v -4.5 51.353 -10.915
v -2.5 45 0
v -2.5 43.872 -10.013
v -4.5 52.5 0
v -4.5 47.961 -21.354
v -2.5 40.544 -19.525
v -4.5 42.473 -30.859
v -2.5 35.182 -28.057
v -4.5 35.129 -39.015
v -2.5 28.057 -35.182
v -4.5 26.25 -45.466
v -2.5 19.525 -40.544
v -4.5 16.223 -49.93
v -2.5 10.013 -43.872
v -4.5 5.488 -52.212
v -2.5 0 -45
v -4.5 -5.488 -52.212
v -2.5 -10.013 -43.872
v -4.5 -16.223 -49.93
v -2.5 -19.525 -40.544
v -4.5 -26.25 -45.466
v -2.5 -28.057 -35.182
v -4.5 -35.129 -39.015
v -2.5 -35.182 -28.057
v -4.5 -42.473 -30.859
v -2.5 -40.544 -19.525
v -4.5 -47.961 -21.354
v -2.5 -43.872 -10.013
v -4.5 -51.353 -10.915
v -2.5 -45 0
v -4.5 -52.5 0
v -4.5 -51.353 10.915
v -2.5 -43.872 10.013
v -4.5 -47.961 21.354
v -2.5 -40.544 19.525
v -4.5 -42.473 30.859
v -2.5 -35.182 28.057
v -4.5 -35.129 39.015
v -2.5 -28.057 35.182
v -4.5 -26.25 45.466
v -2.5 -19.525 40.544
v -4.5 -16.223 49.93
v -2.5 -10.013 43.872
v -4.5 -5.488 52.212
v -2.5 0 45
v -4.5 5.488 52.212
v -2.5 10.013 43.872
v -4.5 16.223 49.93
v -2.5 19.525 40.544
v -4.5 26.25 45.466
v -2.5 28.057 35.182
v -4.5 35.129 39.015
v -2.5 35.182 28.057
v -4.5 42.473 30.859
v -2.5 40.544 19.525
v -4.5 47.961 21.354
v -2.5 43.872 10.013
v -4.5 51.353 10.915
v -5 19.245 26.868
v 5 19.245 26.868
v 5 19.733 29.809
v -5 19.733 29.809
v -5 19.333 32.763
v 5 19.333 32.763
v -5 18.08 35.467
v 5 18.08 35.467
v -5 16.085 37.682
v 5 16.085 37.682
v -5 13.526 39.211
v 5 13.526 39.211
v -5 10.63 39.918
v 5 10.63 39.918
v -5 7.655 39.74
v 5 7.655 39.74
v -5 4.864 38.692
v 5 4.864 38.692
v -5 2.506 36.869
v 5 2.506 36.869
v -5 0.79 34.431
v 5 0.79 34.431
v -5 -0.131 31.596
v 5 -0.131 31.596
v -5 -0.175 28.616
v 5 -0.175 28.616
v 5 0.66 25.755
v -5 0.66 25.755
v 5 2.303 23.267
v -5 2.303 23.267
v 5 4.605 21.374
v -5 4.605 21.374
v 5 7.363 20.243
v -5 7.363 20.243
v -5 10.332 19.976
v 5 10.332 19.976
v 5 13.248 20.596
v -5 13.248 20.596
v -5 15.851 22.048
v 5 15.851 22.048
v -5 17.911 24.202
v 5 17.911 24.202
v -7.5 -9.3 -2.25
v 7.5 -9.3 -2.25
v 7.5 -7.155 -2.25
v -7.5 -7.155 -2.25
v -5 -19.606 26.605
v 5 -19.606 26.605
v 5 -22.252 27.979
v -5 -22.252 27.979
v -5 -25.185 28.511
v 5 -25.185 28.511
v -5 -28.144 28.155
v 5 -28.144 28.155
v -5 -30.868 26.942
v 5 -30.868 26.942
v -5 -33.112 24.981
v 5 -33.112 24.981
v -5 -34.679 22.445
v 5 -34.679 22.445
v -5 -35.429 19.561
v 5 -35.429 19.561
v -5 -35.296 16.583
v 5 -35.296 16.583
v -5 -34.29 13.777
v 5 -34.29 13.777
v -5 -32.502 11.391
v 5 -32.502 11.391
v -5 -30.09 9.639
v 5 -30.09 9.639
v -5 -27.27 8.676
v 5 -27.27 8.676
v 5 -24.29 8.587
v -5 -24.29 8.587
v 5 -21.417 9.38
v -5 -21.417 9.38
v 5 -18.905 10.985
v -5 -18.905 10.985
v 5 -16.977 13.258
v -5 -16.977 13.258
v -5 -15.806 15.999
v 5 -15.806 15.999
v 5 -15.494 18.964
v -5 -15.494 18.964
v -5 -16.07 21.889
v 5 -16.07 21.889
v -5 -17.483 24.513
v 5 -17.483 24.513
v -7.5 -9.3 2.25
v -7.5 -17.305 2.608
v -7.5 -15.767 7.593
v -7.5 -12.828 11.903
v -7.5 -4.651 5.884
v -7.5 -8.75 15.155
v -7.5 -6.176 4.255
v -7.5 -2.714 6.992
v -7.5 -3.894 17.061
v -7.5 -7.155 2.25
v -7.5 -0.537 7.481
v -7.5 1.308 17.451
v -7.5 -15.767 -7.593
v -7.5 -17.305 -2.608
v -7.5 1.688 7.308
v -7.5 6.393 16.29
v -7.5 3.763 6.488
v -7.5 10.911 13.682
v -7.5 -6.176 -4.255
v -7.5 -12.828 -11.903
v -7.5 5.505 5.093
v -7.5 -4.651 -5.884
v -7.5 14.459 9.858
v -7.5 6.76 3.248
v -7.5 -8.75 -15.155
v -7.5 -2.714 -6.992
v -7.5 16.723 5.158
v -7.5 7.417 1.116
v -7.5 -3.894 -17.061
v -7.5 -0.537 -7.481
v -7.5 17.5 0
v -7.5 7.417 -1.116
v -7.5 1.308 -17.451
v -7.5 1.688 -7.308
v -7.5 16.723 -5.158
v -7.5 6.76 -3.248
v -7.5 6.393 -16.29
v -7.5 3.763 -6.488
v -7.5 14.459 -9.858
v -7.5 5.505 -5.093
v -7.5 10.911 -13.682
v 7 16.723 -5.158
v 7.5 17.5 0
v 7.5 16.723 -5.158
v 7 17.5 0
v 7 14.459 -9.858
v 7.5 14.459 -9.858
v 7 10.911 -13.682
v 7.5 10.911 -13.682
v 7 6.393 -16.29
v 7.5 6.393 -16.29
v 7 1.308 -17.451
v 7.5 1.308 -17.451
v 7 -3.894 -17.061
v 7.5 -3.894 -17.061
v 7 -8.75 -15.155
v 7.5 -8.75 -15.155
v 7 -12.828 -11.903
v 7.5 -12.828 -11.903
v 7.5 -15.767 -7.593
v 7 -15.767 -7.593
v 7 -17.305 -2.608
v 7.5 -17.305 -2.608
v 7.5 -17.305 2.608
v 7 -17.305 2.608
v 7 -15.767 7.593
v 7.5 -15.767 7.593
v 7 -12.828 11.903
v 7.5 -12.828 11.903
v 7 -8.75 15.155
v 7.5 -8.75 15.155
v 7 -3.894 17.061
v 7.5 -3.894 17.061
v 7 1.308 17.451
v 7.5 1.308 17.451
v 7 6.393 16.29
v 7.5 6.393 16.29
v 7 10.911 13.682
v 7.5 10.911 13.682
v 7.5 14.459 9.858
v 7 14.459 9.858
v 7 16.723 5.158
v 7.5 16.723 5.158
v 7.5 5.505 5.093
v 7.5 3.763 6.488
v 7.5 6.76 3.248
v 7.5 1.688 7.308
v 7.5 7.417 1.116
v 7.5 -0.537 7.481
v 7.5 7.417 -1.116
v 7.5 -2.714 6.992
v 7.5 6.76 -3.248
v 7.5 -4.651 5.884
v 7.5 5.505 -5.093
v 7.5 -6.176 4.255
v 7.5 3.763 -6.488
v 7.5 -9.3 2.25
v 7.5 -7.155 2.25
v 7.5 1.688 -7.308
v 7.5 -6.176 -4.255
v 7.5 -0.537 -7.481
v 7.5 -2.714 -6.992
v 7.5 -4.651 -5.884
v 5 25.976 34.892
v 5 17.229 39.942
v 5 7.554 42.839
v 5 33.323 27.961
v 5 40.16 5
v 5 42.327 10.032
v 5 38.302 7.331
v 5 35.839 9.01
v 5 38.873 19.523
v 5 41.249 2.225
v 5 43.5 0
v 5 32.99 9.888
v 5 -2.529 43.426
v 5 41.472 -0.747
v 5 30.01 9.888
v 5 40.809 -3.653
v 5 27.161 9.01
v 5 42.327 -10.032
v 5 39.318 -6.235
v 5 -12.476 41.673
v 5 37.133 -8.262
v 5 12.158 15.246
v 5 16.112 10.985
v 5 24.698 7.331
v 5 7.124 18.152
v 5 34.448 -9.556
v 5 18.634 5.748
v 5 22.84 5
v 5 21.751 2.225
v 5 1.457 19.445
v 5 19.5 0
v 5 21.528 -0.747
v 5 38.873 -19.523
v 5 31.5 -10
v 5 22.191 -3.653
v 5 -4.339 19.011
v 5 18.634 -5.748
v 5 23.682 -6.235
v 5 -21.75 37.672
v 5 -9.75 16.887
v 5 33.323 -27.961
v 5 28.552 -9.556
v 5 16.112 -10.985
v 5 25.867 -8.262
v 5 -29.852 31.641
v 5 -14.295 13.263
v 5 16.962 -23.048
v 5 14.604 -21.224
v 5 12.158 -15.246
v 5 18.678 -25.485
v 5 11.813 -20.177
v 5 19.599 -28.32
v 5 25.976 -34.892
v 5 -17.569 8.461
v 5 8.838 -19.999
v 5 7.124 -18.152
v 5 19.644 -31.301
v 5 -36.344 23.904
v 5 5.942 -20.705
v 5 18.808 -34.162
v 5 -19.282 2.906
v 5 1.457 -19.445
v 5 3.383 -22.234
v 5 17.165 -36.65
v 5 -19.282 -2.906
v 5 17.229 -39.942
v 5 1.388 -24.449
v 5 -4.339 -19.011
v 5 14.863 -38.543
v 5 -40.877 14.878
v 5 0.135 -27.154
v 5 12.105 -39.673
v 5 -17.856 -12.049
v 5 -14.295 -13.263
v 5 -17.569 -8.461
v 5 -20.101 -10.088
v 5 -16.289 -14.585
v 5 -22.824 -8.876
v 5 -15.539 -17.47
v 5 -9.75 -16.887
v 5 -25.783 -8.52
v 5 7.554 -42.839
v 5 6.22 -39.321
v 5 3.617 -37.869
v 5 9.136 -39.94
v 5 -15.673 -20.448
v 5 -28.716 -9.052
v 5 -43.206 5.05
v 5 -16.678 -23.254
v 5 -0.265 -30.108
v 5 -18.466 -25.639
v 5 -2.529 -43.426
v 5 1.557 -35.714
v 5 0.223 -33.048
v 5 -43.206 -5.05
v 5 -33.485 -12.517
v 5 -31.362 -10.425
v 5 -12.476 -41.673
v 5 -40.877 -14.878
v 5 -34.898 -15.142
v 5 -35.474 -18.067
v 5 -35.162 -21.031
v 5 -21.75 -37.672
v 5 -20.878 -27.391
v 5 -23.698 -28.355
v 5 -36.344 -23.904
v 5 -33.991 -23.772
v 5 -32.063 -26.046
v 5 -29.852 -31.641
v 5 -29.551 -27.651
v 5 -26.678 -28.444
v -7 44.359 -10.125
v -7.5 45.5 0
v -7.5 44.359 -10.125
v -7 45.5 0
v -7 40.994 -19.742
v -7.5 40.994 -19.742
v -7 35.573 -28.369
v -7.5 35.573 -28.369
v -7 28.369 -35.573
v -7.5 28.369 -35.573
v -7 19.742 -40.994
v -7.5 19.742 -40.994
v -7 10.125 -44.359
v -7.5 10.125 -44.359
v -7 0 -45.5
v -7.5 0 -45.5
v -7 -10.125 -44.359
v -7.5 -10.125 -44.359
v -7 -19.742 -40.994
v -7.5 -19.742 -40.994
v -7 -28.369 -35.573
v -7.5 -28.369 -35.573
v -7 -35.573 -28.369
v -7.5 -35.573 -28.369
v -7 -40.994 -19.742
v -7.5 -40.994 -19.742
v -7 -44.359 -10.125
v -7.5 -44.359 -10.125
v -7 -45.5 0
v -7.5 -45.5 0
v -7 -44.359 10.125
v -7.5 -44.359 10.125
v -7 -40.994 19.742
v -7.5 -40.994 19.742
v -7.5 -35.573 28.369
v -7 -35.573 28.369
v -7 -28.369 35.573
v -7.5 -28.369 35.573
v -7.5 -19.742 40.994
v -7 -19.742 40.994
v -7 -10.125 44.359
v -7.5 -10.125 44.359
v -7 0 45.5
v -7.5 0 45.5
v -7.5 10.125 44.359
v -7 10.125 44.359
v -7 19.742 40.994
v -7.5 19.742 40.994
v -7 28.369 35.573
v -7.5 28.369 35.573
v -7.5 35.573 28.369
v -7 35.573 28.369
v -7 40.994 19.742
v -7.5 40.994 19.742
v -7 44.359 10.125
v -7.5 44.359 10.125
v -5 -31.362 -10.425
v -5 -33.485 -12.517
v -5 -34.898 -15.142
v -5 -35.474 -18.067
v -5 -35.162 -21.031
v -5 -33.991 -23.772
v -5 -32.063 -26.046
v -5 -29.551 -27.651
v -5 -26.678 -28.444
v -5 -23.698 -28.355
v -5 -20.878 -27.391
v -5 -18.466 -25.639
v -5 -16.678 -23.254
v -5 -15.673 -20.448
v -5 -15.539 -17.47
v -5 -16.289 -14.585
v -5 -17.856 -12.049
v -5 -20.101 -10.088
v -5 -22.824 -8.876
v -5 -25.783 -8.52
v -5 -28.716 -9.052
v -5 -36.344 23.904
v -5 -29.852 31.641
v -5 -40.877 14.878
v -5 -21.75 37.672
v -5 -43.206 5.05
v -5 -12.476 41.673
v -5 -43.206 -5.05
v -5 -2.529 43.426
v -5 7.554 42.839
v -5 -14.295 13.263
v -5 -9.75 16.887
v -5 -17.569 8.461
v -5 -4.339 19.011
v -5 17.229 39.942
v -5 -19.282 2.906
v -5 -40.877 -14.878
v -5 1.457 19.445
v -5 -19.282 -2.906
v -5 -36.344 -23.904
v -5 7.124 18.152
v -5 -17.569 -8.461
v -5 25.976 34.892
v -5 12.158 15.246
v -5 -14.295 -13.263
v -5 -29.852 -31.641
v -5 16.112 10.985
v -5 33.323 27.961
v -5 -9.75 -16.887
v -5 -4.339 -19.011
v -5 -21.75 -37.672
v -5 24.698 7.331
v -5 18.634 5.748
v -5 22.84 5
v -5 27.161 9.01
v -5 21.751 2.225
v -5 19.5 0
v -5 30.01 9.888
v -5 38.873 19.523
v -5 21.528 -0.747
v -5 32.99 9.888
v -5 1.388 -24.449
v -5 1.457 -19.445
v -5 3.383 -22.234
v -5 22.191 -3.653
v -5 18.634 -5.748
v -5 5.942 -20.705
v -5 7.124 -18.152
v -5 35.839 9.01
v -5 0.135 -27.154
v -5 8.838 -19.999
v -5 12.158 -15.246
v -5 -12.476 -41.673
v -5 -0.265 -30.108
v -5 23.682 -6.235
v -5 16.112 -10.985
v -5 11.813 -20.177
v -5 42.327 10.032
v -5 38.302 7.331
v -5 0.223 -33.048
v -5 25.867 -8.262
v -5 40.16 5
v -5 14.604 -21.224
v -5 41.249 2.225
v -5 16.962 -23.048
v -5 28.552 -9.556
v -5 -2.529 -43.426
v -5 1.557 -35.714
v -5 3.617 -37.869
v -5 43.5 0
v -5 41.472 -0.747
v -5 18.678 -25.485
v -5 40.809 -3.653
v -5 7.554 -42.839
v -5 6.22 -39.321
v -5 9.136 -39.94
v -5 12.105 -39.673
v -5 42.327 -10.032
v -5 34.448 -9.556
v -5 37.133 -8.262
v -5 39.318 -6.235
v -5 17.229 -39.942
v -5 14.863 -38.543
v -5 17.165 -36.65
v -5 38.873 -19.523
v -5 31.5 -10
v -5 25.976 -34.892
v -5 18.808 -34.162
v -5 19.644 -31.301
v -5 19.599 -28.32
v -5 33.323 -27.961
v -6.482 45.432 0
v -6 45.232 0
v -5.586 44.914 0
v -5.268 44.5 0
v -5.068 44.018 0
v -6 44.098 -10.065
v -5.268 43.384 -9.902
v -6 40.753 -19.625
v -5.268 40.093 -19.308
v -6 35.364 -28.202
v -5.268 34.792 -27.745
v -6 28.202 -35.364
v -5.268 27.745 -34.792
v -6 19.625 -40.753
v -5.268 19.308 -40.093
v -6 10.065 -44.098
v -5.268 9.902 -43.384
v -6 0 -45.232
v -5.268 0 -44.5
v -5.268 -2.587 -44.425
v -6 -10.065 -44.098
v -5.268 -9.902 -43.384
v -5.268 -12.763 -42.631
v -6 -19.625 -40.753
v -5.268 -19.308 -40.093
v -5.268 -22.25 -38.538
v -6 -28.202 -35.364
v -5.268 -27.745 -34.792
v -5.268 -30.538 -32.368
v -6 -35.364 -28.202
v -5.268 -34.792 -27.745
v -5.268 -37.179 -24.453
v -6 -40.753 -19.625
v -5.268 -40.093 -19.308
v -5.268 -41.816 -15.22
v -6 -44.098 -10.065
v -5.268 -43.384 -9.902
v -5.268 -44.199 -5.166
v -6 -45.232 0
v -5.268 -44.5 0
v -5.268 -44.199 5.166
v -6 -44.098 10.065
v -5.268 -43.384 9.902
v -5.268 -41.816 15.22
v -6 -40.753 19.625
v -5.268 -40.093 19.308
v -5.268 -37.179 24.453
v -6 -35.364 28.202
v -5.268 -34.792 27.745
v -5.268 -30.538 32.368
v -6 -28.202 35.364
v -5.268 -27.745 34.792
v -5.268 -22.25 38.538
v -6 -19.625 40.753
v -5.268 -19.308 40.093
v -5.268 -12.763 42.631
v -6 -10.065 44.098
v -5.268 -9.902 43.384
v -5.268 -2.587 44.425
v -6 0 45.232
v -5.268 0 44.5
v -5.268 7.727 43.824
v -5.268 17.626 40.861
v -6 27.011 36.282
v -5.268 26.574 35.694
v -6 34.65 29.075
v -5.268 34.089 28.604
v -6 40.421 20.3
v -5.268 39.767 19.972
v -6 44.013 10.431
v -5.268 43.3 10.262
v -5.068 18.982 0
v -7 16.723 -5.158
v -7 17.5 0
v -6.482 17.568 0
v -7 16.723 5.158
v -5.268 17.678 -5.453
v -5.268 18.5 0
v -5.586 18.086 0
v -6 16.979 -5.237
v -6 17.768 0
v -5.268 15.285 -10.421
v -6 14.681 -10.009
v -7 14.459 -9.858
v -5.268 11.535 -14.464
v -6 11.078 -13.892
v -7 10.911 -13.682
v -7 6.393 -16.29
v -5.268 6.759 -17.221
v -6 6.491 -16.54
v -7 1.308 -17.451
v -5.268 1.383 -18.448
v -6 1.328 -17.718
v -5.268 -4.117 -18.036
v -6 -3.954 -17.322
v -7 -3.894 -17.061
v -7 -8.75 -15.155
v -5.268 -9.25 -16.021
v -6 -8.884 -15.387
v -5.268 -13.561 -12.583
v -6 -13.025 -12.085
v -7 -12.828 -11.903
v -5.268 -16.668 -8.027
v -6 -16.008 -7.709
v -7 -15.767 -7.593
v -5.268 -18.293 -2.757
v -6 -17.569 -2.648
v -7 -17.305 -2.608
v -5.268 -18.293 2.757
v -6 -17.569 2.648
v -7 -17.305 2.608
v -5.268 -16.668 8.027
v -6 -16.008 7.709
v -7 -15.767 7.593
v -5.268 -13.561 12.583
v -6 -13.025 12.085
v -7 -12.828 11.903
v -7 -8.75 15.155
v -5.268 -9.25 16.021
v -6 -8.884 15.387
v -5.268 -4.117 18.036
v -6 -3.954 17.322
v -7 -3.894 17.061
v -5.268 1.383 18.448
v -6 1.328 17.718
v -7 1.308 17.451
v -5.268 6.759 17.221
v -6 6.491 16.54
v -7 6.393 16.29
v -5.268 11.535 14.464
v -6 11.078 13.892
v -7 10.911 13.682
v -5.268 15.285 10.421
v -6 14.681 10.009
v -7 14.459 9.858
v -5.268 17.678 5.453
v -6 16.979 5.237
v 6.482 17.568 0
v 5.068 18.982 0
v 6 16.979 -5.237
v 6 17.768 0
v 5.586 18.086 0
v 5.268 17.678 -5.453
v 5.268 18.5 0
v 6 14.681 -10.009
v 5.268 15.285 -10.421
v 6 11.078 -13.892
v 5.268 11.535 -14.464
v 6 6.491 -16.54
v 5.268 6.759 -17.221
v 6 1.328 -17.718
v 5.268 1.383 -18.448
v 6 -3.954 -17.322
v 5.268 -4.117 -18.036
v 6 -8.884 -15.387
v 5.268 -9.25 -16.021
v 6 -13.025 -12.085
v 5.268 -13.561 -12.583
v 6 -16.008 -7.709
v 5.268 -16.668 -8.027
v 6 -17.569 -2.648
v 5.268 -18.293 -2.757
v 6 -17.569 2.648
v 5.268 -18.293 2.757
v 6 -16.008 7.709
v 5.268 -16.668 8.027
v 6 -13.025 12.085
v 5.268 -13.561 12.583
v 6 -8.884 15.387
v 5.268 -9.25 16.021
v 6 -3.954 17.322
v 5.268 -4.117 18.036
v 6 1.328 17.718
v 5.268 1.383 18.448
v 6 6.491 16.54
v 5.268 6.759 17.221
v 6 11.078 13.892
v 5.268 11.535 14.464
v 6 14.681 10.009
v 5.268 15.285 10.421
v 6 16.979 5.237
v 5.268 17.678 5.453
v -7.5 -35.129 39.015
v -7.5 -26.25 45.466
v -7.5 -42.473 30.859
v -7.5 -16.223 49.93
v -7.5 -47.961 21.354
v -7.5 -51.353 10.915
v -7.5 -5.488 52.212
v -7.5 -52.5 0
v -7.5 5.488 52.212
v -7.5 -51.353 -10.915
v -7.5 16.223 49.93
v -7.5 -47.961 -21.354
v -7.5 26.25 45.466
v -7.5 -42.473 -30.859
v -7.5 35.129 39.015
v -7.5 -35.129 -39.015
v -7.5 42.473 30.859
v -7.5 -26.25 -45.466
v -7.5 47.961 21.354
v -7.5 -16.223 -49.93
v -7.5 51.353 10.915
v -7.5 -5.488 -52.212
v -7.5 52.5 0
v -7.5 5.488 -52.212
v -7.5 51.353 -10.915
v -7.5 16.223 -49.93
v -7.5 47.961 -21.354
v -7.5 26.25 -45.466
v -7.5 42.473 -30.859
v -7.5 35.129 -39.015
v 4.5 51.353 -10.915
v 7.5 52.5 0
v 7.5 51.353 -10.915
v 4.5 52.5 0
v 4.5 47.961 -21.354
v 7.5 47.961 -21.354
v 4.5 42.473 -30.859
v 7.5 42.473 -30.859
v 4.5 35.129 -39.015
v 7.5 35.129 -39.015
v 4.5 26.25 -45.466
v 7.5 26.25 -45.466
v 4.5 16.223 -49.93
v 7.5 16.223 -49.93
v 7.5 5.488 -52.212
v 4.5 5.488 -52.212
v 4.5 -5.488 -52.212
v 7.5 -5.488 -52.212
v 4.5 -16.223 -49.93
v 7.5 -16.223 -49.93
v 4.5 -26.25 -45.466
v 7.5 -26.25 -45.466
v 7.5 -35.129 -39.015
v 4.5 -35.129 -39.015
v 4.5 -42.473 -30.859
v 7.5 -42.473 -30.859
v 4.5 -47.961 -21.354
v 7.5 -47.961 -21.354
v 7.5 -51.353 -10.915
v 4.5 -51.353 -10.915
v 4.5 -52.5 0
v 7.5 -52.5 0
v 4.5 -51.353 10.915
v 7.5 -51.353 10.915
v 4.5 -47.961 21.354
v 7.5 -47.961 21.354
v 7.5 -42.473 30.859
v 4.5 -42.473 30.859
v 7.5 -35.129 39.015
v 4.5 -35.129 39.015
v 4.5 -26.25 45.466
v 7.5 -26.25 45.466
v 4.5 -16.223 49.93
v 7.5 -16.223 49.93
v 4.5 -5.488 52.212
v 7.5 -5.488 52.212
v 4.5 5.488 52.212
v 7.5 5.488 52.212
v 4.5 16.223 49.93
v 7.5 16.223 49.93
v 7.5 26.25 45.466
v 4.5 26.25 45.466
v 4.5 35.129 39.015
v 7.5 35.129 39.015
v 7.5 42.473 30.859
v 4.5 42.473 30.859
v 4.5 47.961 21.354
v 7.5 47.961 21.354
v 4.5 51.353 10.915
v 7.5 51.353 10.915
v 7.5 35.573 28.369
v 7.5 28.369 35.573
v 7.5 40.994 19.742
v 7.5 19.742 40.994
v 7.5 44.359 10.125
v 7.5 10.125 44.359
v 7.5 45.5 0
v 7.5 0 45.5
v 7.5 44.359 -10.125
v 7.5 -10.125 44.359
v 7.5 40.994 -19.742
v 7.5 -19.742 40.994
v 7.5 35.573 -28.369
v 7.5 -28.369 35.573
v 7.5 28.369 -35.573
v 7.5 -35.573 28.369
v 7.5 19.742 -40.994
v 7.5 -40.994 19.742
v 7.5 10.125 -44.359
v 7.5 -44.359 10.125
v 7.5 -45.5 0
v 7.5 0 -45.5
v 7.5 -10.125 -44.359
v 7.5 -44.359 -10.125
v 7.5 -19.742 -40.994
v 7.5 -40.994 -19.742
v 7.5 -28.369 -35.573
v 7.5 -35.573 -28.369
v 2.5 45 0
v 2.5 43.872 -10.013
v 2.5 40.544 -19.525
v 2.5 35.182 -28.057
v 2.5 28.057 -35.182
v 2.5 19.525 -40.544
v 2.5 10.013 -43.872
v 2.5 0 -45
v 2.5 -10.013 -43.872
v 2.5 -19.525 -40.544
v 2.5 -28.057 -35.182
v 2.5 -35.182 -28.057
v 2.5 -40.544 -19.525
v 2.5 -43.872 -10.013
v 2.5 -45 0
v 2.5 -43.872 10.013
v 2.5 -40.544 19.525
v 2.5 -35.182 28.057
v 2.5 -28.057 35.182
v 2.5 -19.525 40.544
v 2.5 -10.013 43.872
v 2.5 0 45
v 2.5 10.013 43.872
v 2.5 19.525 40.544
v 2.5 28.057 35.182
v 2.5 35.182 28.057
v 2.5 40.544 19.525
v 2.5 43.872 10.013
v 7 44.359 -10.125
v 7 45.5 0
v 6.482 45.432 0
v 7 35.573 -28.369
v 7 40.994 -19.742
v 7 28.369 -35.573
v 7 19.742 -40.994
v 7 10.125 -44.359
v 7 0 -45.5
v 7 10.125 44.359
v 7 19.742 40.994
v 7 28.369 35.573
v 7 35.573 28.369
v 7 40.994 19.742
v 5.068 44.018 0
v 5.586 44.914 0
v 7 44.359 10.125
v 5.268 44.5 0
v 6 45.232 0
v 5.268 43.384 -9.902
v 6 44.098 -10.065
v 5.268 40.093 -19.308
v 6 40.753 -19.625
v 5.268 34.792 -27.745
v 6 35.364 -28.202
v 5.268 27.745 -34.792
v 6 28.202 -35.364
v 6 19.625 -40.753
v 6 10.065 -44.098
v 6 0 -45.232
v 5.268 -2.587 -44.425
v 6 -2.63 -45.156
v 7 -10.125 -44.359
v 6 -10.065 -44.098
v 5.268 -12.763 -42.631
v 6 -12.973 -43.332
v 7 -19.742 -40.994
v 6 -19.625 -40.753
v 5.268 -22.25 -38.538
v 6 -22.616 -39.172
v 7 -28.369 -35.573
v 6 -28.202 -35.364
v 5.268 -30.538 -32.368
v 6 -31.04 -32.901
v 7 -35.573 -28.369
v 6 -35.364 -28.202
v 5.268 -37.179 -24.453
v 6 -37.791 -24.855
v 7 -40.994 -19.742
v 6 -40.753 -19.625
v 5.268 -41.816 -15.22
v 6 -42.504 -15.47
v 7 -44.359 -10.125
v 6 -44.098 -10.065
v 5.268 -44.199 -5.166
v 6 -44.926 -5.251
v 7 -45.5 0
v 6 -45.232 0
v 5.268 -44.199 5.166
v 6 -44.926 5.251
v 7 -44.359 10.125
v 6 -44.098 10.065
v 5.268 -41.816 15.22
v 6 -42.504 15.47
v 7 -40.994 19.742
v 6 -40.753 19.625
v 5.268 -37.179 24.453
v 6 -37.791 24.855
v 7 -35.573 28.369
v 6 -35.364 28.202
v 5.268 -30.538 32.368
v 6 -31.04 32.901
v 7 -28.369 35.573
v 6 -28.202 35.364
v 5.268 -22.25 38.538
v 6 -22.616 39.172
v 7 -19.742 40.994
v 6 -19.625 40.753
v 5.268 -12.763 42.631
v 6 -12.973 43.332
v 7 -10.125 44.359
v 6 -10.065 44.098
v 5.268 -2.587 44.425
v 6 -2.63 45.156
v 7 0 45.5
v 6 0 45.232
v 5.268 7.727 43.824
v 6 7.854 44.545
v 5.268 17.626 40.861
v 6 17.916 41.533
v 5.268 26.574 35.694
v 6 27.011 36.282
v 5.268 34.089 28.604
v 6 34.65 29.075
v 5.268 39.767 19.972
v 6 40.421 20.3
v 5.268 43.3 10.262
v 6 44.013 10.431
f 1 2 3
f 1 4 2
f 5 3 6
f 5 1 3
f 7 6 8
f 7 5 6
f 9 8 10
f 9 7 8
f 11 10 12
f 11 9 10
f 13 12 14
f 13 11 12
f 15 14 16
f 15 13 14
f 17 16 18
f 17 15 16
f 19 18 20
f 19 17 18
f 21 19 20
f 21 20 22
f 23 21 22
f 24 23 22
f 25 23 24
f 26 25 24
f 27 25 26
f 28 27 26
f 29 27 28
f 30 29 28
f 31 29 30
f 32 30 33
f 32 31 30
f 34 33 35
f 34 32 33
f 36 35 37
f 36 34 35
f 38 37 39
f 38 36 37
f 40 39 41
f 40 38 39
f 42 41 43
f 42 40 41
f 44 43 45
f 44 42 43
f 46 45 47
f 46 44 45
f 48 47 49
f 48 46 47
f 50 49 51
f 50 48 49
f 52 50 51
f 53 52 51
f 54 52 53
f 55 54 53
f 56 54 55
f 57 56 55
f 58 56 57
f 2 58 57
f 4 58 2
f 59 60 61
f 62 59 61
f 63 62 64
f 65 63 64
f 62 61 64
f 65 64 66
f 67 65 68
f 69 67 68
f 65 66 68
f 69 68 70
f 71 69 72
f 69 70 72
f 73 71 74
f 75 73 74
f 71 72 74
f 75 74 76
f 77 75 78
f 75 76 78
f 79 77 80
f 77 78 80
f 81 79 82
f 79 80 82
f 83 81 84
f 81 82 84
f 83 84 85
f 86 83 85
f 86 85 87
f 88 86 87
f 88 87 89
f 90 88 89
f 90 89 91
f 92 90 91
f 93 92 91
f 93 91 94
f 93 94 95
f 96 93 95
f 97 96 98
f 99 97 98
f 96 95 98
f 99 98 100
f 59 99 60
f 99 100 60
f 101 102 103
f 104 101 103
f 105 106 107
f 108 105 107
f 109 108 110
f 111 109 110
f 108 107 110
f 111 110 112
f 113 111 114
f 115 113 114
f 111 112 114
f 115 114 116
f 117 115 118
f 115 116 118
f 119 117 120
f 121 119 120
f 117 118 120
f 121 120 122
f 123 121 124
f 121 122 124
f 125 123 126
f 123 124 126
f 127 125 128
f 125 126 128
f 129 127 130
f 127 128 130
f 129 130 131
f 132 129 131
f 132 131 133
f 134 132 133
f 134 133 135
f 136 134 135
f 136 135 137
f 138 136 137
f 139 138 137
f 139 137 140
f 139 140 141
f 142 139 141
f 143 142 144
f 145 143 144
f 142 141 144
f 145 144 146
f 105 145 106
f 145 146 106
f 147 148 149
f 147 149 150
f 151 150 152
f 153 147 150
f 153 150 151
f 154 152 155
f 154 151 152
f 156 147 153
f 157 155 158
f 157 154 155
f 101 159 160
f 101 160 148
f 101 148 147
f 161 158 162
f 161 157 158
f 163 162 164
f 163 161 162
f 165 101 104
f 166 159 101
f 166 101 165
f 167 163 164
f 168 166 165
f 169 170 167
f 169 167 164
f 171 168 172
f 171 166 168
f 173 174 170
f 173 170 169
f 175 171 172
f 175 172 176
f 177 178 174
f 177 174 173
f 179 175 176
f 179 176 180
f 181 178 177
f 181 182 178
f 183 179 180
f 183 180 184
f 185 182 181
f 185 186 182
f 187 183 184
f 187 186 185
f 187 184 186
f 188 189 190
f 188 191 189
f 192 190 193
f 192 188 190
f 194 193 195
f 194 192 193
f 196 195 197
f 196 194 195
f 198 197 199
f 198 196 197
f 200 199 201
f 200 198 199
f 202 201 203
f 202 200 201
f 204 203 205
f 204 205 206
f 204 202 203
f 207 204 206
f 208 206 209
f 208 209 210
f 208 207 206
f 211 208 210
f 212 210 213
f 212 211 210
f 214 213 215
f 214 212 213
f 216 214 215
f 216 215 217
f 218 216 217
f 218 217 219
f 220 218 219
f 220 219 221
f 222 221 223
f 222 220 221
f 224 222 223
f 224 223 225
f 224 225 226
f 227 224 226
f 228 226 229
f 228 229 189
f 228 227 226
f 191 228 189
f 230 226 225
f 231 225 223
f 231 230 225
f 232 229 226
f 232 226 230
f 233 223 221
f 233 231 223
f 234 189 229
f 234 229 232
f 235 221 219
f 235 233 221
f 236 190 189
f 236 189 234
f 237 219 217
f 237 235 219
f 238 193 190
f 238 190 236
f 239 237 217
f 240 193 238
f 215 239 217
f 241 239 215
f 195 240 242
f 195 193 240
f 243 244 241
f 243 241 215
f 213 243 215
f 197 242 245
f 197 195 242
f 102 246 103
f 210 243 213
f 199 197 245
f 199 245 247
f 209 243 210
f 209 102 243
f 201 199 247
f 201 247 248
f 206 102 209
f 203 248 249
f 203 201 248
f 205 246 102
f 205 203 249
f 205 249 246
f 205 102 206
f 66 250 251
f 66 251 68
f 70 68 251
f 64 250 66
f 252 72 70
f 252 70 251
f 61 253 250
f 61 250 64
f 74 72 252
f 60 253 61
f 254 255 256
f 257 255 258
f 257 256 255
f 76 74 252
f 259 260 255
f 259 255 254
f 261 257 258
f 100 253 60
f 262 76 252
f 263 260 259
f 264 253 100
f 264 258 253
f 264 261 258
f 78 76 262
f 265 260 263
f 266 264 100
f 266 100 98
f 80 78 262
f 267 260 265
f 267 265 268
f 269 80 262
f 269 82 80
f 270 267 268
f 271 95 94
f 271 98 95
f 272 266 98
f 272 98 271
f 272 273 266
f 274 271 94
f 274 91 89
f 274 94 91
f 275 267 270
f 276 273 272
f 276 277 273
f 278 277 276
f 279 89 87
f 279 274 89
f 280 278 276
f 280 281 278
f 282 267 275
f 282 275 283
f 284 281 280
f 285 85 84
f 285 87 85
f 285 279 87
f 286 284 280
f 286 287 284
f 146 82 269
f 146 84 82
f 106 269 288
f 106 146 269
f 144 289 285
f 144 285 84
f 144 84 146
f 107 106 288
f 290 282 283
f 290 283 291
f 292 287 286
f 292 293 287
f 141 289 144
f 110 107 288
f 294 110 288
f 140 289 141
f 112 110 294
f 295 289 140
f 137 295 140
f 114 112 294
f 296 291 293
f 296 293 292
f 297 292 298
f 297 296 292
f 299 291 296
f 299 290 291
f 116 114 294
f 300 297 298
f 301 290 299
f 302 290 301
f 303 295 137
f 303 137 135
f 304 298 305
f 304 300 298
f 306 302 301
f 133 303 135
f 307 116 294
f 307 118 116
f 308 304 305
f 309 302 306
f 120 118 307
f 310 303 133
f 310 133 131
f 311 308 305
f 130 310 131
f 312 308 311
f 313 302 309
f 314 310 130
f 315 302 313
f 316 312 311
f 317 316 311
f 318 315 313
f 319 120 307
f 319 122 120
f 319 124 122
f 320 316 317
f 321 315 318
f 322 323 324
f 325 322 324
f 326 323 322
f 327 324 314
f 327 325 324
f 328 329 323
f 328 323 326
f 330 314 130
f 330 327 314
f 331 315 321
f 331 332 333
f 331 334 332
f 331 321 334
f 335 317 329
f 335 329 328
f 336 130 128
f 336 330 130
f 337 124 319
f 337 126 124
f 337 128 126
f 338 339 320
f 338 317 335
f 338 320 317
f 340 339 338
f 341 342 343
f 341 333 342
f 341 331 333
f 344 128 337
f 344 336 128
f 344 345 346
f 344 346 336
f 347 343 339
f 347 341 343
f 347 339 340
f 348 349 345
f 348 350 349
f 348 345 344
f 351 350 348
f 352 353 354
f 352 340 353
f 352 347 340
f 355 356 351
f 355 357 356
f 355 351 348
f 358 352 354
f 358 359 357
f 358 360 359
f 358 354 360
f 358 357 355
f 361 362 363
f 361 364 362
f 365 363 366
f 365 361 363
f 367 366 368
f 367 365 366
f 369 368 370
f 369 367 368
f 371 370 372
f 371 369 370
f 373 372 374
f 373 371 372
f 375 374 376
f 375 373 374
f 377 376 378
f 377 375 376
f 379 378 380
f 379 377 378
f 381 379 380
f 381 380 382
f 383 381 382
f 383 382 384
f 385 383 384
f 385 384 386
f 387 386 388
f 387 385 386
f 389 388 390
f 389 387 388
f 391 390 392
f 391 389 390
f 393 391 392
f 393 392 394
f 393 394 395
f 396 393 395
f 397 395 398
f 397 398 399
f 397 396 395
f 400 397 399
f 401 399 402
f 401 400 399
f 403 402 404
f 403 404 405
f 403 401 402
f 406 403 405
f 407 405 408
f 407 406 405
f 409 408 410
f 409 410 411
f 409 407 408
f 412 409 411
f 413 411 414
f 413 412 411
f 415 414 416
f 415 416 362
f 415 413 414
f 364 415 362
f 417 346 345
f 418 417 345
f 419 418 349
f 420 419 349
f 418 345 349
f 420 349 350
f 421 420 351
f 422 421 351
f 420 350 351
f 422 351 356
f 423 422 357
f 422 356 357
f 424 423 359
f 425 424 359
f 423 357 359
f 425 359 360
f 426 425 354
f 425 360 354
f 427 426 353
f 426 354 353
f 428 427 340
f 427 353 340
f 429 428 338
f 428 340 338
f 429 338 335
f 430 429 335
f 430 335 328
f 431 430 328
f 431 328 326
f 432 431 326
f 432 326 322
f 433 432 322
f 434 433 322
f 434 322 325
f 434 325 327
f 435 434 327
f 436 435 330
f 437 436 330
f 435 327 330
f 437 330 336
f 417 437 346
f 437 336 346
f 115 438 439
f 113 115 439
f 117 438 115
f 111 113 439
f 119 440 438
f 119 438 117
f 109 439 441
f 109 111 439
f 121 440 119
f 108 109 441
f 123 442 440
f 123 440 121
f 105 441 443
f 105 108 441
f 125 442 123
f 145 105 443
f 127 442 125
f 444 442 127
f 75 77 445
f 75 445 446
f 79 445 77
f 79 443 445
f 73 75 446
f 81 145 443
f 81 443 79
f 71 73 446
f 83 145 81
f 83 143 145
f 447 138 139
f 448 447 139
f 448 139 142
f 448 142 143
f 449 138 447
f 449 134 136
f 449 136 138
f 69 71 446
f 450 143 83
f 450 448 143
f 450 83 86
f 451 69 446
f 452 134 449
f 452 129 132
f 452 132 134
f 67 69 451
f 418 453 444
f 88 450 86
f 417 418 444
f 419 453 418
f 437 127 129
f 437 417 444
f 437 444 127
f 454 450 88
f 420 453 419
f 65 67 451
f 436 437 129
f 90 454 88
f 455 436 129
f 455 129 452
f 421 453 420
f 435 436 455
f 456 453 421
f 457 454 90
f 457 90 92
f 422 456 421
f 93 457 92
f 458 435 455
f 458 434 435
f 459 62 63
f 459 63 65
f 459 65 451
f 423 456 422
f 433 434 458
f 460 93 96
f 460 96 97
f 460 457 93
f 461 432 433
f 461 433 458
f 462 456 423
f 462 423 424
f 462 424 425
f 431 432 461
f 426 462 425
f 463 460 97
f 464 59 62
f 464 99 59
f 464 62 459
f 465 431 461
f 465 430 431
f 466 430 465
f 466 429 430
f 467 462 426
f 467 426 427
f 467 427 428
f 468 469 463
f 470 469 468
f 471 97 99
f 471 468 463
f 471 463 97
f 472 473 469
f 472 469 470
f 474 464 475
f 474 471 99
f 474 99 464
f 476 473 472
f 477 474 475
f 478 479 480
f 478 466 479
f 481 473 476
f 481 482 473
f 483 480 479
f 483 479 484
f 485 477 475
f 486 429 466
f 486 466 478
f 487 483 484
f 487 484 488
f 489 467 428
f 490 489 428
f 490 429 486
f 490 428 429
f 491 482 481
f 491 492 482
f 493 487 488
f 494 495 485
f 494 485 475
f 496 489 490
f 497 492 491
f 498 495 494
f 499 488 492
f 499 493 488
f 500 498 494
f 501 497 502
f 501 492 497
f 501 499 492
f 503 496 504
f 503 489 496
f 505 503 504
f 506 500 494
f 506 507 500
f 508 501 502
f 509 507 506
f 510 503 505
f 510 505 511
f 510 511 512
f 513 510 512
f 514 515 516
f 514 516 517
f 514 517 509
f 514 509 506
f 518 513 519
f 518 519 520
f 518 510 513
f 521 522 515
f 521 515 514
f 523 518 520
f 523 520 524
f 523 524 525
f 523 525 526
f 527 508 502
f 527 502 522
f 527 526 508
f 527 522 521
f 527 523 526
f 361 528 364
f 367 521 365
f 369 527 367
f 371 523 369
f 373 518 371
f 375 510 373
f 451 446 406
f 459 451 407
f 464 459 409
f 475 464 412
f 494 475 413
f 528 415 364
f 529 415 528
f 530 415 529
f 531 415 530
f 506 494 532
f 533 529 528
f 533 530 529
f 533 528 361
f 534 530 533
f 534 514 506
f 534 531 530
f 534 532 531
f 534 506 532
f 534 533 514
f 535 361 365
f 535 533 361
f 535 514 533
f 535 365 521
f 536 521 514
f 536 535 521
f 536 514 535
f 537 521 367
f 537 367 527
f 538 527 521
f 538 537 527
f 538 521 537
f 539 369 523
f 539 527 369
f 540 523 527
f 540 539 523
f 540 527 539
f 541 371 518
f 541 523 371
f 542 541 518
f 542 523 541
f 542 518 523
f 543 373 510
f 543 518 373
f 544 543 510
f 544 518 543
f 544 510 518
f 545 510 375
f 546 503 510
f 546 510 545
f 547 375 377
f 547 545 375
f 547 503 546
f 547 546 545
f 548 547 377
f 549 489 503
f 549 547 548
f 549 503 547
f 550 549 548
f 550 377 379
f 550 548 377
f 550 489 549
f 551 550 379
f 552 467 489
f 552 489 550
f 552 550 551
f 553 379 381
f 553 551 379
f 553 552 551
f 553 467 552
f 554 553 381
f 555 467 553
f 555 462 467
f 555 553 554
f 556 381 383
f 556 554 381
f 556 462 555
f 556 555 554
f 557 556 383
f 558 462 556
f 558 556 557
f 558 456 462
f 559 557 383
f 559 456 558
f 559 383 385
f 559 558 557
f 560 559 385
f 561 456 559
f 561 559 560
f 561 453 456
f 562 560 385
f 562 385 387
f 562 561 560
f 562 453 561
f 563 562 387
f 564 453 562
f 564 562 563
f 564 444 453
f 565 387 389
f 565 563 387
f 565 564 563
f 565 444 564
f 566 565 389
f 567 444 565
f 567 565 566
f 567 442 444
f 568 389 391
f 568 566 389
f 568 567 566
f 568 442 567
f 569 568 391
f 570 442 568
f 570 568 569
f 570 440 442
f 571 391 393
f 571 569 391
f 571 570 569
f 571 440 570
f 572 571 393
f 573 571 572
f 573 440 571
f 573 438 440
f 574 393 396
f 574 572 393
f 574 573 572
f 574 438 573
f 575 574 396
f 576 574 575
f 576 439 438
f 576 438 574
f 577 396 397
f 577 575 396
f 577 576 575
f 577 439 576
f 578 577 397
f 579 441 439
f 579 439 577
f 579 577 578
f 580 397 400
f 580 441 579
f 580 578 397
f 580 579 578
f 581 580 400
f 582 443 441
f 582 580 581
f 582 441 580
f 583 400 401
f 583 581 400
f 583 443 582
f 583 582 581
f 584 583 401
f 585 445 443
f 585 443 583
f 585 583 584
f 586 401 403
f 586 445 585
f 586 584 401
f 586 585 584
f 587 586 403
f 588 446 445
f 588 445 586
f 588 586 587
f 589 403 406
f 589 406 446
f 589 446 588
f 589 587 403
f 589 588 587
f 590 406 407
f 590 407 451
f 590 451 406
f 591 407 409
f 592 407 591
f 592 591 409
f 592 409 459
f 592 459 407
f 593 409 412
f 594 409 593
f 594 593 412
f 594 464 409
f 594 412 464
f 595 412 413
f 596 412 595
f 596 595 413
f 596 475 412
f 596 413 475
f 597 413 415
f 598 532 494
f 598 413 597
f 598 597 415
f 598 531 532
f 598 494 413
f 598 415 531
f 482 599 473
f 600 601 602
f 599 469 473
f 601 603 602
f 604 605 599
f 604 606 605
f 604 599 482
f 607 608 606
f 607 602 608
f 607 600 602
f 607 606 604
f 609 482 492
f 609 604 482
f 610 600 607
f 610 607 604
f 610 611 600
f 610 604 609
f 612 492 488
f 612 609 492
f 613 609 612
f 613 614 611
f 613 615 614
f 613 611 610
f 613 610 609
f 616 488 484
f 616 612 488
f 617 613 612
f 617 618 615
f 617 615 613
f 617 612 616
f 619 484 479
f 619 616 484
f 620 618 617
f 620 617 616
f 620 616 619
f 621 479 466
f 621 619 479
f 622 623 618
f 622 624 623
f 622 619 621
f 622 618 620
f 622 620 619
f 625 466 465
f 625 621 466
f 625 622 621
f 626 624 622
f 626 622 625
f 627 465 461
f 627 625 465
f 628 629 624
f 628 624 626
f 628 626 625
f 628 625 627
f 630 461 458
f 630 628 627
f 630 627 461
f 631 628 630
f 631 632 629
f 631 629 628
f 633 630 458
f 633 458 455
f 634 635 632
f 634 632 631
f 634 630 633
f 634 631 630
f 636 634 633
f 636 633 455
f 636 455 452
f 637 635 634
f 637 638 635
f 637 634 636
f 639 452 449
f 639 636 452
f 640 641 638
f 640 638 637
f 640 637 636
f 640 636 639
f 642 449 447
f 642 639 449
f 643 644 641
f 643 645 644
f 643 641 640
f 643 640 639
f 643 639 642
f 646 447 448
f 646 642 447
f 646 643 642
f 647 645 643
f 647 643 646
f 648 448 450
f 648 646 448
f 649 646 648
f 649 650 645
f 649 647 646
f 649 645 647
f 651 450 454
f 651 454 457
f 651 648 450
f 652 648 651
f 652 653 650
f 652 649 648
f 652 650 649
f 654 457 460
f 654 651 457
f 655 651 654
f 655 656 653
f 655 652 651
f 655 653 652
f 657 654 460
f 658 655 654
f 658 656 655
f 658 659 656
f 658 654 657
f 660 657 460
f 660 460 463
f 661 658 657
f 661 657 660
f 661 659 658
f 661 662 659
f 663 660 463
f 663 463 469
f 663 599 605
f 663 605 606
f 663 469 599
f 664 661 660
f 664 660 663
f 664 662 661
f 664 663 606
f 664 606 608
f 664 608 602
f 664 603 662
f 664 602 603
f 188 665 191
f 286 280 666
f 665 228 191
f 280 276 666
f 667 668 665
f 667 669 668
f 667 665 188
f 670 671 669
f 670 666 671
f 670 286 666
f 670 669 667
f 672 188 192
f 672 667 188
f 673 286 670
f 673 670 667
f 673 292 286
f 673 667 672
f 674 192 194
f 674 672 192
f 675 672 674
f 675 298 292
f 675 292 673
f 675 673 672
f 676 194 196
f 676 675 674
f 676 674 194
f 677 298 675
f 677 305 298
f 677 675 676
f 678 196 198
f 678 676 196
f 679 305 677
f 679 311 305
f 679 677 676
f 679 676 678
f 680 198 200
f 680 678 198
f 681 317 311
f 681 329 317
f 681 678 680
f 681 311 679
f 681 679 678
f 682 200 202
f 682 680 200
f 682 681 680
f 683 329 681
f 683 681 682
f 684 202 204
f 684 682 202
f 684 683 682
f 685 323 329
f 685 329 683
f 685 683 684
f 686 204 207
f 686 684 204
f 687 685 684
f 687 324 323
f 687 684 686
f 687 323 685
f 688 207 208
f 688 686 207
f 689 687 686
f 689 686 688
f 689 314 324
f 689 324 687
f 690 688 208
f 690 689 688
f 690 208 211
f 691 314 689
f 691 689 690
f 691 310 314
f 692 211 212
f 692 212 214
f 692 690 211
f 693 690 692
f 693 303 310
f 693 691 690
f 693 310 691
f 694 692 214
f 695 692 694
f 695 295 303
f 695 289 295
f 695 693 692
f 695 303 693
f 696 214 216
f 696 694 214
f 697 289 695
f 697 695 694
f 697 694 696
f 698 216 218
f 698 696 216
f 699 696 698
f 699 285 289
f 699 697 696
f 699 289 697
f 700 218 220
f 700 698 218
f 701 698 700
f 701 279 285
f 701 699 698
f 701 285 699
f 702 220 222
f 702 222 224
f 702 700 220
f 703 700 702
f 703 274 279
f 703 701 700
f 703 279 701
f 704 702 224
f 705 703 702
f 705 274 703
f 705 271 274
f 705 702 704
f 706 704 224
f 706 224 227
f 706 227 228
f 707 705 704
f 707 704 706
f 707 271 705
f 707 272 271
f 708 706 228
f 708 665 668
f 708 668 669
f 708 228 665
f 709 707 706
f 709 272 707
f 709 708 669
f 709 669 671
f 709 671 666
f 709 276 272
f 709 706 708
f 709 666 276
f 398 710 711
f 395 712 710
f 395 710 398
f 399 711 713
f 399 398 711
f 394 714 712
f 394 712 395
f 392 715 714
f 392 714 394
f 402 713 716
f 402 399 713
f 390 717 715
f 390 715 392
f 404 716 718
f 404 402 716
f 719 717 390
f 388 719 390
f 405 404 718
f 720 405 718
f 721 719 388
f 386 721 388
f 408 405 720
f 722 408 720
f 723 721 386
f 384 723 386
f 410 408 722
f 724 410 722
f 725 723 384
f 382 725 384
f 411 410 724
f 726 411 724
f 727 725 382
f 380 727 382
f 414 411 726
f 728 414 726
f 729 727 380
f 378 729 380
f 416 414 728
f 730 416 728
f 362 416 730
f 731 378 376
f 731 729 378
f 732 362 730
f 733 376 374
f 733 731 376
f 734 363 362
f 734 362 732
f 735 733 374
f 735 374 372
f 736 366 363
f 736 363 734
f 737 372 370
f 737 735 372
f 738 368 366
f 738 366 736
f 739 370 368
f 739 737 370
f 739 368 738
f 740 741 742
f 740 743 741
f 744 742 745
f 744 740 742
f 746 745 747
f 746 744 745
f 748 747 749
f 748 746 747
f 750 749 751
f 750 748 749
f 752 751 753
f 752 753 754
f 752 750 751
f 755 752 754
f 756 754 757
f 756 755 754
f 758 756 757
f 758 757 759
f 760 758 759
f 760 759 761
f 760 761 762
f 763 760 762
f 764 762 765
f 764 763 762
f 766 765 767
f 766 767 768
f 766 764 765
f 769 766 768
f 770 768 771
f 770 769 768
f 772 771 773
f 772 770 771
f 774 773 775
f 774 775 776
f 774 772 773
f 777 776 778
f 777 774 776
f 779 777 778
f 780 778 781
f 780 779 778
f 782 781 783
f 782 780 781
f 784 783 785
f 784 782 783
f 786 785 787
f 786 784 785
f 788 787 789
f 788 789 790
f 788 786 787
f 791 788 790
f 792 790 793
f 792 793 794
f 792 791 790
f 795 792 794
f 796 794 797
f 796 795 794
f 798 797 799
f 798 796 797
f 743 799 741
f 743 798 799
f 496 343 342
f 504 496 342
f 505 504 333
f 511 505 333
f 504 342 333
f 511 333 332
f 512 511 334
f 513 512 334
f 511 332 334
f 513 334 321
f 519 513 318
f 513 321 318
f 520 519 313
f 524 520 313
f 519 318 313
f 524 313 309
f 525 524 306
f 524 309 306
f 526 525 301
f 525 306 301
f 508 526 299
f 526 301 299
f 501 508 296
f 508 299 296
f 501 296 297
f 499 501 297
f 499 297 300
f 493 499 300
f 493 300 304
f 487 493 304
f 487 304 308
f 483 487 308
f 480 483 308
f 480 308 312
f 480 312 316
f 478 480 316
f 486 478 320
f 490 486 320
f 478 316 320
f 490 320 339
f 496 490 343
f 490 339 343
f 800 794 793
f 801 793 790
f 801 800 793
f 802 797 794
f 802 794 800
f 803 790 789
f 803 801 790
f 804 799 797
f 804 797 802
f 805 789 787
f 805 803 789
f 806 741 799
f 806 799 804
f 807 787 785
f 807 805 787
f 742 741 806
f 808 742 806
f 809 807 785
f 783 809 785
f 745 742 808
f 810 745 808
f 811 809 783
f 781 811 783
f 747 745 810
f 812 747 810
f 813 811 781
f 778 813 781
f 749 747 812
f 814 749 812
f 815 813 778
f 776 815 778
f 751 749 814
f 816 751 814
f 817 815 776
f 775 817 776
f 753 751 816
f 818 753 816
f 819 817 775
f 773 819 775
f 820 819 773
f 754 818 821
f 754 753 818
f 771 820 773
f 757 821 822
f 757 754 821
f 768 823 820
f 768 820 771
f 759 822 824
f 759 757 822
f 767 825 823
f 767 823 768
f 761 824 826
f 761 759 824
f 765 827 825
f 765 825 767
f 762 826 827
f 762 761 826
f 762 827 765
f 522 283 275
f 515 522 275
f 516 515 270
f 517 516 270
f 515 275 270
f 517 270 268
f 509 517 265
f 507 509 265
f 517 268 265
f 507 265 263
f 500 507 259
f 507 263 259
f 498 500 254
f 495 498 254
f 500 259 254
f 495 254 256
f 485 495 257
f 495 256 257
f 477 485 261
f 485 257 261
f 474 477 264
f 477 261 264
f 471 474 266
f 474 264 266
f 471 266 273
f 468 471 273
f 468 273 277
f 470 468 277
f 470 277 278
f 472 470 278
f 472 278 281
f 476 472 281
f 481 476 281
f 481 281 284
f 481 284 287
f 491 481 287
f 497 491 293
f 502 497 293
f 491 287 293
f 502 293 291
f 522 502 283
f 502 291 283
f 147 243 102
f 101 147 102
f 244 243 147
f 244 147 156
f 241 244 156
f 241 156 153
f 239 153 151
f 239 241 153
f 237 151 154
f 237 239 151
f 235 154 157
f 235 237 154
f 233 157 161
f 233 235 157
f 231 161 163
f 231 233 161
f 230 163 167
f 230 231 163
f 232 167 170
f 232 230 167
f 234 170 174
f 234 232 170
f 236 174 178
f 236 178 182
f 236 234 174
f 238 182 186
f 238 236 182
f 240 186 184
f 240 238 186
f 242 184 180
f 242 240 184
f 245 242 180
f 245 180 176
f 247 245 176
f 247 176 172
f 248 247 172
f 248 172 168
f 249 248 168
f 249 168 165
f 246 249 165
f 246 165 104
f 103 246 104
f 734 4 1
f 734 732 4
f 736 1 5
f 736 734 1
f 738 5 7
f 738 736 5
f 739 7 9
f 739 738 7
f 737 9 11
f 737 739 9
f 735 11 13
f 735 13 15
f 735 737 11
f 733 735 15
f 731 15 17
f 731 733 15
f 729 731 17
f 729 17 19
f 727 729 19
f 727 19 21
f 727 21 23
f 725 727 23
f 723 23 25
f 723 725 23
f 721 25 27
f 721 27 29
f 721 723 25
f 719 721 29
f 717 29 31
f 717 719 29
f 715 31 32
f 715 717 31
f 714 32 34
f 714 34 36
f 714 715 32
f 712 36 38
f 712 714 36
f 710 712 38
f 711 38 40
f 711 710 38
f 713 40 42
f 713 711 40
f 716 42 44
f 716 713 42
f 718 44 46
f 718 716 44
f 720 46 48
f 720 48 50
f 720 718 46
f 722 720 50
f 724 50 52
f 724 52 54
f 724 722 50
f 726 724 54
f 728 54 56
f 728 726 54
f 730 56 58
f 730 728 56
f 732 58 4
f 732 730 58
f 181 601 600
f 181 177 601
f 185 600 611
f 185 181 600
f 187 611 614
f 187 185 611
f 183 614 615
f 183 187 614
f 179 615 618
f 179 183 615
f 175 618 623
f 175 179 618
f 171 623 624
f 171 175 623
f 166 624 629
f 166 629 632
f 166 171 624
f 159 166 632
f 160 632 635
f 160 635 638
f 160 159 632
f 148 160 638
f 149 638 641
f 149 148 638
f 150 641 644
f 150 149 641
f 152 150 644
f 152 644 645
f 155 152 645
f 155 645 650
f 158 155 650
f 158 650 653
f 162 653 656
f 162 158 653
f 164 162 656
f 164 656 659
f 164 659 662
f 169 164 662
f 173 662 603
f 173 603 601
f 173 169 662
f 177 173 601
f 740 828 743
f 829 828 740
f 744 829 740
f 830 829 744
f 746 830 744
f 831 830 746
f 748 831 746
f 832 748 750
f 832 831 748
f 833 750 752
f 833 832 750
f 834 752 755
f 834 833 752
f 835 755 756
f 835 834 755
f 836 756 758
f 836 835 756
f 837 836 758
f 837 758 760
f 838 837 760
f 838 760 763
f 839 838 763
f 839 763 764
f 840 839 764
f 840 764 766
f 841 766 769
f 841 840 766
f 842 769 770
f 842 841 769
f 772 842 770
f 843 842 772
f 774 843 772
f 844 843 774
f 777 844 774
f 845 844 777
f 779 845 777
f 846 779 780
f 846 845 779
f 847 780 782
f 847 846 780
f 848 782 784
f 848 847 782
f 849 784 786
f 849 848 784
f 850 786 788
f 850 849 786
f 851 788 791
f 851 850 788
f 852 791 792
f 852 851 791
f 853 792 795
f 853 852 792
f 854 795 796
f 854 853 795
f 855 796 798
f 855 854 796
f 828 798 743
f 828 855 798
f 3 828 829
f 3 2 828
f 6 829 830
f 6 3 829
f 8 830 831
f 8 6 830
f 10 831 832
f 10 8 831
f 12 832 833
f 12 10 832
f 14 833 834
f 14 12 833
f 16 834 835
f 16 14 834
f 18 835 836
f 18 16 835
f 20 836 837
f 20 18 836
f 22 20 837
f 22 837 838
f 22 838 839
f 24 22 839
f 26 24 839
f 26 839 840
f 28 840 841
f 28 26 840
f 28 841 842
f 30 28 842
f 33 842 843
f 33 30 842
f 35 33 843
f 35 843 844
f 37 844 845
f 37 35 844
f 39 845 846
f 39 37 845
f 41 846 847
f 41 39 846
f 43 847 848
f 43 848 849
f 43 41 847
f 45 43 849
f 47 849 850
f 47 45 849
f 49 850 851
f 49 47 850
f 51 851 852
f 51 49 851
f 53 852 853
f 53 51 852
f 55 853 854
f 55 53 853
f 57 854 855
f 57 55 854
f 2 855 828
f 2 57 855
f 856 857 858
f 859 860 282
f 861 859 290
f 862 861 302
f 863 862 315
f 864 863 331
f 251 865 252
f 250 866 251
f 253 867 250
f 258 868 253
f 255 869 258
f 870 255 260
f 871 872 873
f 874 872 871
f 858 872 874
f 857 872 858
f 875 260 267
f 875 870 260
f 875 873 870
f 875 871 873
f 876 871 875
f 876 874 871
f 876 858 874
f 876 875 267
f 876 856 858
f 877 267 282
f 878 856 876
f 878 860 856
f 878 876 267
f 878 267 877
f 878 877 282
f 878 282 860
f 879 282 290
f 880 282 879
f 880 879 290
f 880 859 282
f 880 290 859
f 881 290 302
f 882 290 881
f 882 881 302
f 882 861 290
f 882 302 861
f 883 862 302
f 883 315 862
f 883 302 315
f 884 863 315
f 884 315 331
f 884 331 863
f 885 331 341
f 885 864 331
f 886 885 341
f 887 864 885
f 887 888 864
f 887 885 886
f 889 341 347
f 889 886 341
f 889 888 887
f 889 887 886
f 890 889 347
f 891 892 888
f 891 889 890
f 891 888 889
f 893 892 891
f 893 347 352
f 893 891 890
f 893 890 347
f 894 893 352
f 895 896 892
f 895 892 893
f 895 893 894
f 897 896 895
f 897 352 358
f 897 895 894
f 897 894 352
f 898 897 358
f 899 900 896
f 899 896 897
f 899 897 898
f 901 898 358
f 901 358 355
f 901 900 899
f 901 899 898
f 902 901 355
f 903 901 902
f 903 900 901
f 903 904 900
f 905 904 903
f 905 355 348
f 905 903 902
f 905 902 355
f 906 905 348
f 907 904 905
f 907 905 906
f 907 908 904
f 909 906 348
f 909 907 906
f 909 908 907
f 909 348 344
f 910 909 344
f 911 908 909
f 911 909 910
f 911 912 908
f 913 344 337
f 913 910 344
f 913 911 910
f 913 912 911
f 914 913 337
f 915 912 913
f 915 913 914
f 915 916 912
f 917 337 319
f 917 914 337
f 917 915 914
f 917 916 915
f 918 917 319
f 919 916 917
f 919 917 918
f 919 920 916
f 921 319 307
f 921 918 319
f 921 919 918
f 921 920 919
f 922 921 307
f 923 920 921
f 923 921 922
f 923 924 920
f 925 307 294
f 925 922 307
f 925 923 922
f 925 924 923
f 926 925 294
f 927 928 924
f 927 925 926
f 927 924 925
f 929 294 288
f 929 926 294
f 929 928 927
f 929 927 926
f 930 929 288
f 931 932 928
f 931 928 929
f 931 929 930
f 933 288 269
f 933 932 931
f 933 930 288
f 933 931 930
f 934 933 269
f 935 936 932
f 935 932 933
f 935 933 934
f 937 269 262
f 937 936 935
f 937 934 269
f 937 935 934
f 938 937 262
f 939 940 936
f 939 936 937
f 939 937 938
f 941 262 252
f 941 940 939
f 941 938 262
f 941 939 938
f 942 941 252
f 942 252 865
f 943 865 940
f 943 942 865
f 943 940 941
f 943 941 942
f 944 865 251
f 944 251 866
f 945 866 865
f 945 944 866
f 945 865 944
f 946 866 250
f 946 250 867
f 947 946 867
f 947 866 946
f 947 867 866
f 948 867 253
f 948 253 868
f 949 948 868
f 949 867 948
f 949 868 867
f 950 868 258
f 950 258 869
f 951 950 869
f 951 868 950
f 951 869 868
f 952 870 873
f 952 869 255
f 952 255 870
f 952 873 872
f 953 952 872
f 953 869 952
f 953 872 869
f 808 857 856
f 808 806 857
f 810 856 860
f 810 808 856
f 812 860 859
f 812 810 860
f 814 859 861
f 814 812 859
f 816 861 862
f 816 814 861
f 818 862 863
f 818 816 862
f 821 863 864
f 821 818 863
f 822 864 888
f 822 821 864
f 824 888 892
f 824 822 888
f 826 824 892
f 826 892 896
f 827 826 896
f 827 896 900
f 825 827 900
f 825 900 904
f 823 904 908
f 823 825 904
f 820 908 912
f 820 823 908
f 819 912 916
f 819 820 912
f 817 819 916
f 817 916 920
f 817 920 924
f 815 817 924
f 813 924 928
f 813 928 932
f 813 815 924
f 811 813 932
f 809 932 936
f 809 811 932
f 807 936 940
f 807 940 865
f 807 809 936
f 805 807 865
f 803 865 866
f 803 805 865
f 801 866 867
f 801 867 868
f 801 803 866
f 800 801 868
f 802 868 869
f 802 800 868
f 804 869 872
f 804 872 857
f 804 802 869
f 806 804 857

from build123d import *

# Parameters (mm, degrees)
SKETCH2_R         = 10
EXTRUDE1_DEPTH    = 10
CIRPATTERN1_COUNT = 5
SKETCH3_W         = 4.5
SKETCH3_H         = 2.3
EXTRUDE2_DEPTH    = 16


with BuildPart() as part:
    # Sketch1 → Revolve1 (revolve)
    with BuildSketch(Plane.XY):
        with BuildLine():
            Line((-7.5, 7.5), (7.5, 7.5))
            Line((7.5, 7.5), (7.5, 17.5))
            Line((7.5, 17.5), (7, 17.5))
            ThreePointArc((7, 17.5), (5.585786438, 18.085786438), (5, 19.5))
            Line((5, 19.5), (5, 43.5))
            ThreePointArc((5, 43.5), (5.585786438, 44.914213562), (7, 45.5))
            Line((7, 45.5), (7.5, 45.5))
            Line((7.5, 45.5), (7.5, 52.5))
            Line((7.5, 52.5), (4.5, 52.5))
            Line((4.5, 52.5), (2.5, 45))
            Line((2.5, 45), (-2.5, 45))
            Line((-2.5, 45), (-4.5, 52.5))
            Line((-4.5, 52.5), (-7.5, 52.5))
            Line((-7.5, 52.5), (-7.5, 45.5))
            Line((-7.5, 45.5), (-7, 45.5))
            ThreePointArc((-7, 45.5), (-5.585786438, 44.914213562), (-5, 43.5))
            Line((-5, 43.5), (-5, 19.5))
            ThreePointArc((-5, 19.5), (-5.585786438, 18.085786438), (-7, 17.5))
            Line((-7, 17.5), (-7.5, 17.5))
            Line((-7.5, 17.5), (-7.5, 7.5))
        make_face()
    revolve(axis=Axis((25.864037296, 0, 0), (-1, 0, 0)))

    # Sketch2 → Extrude1 (cut)
    with BuildSketch(Plane(origin=(5, 0, 0), x_dir=(0, 0, -1), z_dir=(1, 0, 0))):
        with Locations((0, 31.5)):
            Circle(SKETCH2_R)
    extrude1 = extrude(amount=-EXTRUDE1_DEPTH, mode=Mode.SUBTRACT)

    # CirPattern1: Extrude1 ×5 about axis
    cirpattern1_axis = Axis((0, 0, 0), (1, 0, 0))
    for i in range(1, CIRPATTERN1_COUNT):
        add(extrude1.rotate(cirpattern1_axis, i * 360 / CIRPATTERN1_COUNT), mode=Mode.SUBTRACT)

    # Sketch3 → Extrude2 (cut, through all)
    with BuildSketch(Plane(origin=(7.5, 0, 0), x_dir=(0, 0, -1), z_dir=(1, 0, 0))):
        with Locations((0, -8.15)):
            Rectangle(SKETCH3_W, SKETCH3_H)
    extrude(amount=-EXTRUDE2_DEPTH, mode=Mode.SUBTRACT)


solid = part.part
